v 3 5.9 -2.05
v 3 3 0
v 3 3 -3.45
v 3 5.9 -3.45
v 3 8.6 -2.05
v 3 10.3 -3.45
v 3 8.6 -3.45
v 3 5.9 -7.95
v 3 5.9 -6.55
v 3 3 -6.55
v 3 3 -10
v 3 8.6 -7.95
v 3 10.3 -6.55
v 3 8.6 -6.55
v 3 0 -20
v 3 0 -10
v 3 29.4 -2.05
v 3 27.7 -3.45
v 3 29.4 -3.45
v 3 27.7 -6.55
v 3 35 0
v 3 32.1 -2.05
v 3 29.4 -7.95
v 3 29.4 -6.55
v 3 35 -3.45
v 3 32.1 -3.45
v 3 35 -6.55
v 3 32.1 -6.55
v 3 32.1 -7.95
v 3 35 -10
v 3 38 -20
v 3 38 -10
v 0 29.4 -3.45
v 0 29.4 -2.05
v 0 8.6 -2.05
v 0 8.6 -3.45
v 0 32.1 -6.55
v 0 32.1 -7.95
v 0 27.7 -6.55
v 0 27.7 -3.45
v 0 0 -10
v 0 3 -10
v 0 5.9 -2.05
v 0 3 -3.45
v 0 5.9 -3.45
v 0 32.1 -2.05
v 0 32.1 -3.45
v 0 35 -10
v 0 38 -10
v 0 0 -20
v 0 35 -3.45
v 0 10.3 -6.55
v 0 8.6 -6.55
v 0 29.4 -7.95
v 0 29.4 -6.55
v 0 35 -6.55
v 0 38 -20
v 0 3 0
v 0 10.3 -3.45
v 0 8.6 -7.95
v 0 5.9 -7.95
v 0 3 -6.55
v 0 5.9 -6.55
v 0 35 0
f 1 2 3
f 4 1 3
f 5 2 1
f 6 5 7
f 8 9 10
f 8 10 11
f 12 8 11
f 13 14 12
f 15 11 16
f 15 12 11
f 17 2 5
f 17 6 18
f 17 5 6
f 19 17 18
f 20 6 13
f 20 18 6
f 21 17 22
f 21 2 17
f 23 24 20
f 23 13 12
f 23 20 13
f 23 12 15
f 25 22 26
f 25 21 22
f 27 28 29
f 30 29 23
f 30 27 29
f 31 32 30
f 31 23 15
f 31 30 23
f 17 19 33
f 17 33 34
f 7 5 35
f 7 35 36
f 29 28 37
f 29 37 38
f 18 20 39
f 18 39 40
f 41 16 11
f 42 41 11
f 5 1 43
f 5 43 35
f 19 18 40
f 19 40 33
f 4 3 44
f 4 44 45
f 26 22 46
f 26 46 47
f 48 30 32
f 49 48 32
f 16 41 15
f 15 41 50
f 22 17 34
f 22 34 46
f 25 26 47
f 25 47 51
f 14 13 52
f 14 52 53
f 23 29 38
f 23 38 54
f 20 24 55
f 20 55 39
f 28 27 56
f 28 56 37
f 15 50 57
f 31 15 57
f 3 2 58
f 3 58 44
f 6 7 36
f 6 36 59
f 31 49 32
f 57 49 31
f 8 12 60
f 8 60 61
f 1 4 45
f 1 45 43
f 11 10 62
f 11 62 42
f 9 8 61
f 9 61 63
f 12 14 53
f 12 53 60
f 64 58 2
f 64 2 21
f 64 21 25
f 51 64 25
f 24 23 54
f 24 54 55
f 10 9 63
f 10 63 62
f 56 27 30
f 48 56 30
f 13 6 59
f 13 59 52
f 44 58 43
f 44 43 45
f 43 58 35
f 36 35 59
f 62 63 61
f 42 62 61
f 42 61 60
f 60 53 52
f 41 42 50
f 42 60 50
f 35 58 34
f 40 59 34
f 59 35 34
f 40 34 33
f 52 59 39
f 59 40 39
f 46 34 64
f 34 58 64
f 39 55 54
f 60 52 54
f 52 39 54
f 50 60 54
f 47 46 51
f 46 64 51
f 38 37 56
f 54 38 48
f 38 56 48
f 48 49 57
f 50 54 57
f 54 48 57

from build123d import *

# Parameters (mm, degrees)
SKETCH1_W           = 20
SKETCH1_H           = 38
BOSS_EXTRUDE1_DEPTH = 3
SKETCH2_W           = 10
SKETCH2_H           = 3
CUT_EXTRUDE1_DEPTH  = 3
CUT_EXTRUDE2_DEPTH  = 3


with BuildPart() as part:
    # Sketch1 → Boss-Extrude1 (new body)
    with BuildSketch(Plane(origin=(0, 0, 0), x_dir=(0, 0, -1), z_dir=(1, 0, 0))):
        with Locations((10, 19)):
            Rectangle(SKETCH1_W, SKETCH1_H)
    extrude(amount=BOSS_EXTRUDE1_DEPTH)

    # Sketch2 → Cut-Extrude1 (cut)
    with BuildSketch(Plane(origin=(3, 0, 0), x_dir=(0, 0, -1), z_dir=(1, 0, 0))):
        with Locations((5, 36.5)):
            Rectangle(SKETCH2_W, SKETCH2_H)
        with Locations((5, 1.5)):
            Rectangle(SKETCH2_W, SKETCH2_H)
    extrude(amount=-CUT_EXTRUDE1_DEPTH, mode=Mode.SUBTRACT)

    # Sketch3 → Cut-Extrude2 (cut)
    with BuildSketch(Plane(origin=(3, 0, 0), x_dir=(0, 0, -1), z_dir=(1, 0, 0))):
        Polygon((3.45, 3), (3.45, 5.9), (2.05, 5.9), (2.05, 8.6), (3.45, 8.6), (3.45, 10.3), (6.55, 10.3), (6.55, 8.6), (7.95, 8.6), (7.95, 5.9), (6.55, 5.9), (6.55, 3), align=None)
        Polygon((6.55, 35), (6.55, 32.1), (7.95, 32.1), (7.95, 29.4), (6.55, 29.4), (6.55, 27.7), (3.45, 27.7), (3.45, 29.4), (2.05, 29.4), (2.05, 32.1), (3.45, 32.1), (3.45, 35), align=None)
    extrude(amount=-CUT_EXTRUDE2_DEPTH, mode=Mode.SUBTRACT)


solid = part.part
